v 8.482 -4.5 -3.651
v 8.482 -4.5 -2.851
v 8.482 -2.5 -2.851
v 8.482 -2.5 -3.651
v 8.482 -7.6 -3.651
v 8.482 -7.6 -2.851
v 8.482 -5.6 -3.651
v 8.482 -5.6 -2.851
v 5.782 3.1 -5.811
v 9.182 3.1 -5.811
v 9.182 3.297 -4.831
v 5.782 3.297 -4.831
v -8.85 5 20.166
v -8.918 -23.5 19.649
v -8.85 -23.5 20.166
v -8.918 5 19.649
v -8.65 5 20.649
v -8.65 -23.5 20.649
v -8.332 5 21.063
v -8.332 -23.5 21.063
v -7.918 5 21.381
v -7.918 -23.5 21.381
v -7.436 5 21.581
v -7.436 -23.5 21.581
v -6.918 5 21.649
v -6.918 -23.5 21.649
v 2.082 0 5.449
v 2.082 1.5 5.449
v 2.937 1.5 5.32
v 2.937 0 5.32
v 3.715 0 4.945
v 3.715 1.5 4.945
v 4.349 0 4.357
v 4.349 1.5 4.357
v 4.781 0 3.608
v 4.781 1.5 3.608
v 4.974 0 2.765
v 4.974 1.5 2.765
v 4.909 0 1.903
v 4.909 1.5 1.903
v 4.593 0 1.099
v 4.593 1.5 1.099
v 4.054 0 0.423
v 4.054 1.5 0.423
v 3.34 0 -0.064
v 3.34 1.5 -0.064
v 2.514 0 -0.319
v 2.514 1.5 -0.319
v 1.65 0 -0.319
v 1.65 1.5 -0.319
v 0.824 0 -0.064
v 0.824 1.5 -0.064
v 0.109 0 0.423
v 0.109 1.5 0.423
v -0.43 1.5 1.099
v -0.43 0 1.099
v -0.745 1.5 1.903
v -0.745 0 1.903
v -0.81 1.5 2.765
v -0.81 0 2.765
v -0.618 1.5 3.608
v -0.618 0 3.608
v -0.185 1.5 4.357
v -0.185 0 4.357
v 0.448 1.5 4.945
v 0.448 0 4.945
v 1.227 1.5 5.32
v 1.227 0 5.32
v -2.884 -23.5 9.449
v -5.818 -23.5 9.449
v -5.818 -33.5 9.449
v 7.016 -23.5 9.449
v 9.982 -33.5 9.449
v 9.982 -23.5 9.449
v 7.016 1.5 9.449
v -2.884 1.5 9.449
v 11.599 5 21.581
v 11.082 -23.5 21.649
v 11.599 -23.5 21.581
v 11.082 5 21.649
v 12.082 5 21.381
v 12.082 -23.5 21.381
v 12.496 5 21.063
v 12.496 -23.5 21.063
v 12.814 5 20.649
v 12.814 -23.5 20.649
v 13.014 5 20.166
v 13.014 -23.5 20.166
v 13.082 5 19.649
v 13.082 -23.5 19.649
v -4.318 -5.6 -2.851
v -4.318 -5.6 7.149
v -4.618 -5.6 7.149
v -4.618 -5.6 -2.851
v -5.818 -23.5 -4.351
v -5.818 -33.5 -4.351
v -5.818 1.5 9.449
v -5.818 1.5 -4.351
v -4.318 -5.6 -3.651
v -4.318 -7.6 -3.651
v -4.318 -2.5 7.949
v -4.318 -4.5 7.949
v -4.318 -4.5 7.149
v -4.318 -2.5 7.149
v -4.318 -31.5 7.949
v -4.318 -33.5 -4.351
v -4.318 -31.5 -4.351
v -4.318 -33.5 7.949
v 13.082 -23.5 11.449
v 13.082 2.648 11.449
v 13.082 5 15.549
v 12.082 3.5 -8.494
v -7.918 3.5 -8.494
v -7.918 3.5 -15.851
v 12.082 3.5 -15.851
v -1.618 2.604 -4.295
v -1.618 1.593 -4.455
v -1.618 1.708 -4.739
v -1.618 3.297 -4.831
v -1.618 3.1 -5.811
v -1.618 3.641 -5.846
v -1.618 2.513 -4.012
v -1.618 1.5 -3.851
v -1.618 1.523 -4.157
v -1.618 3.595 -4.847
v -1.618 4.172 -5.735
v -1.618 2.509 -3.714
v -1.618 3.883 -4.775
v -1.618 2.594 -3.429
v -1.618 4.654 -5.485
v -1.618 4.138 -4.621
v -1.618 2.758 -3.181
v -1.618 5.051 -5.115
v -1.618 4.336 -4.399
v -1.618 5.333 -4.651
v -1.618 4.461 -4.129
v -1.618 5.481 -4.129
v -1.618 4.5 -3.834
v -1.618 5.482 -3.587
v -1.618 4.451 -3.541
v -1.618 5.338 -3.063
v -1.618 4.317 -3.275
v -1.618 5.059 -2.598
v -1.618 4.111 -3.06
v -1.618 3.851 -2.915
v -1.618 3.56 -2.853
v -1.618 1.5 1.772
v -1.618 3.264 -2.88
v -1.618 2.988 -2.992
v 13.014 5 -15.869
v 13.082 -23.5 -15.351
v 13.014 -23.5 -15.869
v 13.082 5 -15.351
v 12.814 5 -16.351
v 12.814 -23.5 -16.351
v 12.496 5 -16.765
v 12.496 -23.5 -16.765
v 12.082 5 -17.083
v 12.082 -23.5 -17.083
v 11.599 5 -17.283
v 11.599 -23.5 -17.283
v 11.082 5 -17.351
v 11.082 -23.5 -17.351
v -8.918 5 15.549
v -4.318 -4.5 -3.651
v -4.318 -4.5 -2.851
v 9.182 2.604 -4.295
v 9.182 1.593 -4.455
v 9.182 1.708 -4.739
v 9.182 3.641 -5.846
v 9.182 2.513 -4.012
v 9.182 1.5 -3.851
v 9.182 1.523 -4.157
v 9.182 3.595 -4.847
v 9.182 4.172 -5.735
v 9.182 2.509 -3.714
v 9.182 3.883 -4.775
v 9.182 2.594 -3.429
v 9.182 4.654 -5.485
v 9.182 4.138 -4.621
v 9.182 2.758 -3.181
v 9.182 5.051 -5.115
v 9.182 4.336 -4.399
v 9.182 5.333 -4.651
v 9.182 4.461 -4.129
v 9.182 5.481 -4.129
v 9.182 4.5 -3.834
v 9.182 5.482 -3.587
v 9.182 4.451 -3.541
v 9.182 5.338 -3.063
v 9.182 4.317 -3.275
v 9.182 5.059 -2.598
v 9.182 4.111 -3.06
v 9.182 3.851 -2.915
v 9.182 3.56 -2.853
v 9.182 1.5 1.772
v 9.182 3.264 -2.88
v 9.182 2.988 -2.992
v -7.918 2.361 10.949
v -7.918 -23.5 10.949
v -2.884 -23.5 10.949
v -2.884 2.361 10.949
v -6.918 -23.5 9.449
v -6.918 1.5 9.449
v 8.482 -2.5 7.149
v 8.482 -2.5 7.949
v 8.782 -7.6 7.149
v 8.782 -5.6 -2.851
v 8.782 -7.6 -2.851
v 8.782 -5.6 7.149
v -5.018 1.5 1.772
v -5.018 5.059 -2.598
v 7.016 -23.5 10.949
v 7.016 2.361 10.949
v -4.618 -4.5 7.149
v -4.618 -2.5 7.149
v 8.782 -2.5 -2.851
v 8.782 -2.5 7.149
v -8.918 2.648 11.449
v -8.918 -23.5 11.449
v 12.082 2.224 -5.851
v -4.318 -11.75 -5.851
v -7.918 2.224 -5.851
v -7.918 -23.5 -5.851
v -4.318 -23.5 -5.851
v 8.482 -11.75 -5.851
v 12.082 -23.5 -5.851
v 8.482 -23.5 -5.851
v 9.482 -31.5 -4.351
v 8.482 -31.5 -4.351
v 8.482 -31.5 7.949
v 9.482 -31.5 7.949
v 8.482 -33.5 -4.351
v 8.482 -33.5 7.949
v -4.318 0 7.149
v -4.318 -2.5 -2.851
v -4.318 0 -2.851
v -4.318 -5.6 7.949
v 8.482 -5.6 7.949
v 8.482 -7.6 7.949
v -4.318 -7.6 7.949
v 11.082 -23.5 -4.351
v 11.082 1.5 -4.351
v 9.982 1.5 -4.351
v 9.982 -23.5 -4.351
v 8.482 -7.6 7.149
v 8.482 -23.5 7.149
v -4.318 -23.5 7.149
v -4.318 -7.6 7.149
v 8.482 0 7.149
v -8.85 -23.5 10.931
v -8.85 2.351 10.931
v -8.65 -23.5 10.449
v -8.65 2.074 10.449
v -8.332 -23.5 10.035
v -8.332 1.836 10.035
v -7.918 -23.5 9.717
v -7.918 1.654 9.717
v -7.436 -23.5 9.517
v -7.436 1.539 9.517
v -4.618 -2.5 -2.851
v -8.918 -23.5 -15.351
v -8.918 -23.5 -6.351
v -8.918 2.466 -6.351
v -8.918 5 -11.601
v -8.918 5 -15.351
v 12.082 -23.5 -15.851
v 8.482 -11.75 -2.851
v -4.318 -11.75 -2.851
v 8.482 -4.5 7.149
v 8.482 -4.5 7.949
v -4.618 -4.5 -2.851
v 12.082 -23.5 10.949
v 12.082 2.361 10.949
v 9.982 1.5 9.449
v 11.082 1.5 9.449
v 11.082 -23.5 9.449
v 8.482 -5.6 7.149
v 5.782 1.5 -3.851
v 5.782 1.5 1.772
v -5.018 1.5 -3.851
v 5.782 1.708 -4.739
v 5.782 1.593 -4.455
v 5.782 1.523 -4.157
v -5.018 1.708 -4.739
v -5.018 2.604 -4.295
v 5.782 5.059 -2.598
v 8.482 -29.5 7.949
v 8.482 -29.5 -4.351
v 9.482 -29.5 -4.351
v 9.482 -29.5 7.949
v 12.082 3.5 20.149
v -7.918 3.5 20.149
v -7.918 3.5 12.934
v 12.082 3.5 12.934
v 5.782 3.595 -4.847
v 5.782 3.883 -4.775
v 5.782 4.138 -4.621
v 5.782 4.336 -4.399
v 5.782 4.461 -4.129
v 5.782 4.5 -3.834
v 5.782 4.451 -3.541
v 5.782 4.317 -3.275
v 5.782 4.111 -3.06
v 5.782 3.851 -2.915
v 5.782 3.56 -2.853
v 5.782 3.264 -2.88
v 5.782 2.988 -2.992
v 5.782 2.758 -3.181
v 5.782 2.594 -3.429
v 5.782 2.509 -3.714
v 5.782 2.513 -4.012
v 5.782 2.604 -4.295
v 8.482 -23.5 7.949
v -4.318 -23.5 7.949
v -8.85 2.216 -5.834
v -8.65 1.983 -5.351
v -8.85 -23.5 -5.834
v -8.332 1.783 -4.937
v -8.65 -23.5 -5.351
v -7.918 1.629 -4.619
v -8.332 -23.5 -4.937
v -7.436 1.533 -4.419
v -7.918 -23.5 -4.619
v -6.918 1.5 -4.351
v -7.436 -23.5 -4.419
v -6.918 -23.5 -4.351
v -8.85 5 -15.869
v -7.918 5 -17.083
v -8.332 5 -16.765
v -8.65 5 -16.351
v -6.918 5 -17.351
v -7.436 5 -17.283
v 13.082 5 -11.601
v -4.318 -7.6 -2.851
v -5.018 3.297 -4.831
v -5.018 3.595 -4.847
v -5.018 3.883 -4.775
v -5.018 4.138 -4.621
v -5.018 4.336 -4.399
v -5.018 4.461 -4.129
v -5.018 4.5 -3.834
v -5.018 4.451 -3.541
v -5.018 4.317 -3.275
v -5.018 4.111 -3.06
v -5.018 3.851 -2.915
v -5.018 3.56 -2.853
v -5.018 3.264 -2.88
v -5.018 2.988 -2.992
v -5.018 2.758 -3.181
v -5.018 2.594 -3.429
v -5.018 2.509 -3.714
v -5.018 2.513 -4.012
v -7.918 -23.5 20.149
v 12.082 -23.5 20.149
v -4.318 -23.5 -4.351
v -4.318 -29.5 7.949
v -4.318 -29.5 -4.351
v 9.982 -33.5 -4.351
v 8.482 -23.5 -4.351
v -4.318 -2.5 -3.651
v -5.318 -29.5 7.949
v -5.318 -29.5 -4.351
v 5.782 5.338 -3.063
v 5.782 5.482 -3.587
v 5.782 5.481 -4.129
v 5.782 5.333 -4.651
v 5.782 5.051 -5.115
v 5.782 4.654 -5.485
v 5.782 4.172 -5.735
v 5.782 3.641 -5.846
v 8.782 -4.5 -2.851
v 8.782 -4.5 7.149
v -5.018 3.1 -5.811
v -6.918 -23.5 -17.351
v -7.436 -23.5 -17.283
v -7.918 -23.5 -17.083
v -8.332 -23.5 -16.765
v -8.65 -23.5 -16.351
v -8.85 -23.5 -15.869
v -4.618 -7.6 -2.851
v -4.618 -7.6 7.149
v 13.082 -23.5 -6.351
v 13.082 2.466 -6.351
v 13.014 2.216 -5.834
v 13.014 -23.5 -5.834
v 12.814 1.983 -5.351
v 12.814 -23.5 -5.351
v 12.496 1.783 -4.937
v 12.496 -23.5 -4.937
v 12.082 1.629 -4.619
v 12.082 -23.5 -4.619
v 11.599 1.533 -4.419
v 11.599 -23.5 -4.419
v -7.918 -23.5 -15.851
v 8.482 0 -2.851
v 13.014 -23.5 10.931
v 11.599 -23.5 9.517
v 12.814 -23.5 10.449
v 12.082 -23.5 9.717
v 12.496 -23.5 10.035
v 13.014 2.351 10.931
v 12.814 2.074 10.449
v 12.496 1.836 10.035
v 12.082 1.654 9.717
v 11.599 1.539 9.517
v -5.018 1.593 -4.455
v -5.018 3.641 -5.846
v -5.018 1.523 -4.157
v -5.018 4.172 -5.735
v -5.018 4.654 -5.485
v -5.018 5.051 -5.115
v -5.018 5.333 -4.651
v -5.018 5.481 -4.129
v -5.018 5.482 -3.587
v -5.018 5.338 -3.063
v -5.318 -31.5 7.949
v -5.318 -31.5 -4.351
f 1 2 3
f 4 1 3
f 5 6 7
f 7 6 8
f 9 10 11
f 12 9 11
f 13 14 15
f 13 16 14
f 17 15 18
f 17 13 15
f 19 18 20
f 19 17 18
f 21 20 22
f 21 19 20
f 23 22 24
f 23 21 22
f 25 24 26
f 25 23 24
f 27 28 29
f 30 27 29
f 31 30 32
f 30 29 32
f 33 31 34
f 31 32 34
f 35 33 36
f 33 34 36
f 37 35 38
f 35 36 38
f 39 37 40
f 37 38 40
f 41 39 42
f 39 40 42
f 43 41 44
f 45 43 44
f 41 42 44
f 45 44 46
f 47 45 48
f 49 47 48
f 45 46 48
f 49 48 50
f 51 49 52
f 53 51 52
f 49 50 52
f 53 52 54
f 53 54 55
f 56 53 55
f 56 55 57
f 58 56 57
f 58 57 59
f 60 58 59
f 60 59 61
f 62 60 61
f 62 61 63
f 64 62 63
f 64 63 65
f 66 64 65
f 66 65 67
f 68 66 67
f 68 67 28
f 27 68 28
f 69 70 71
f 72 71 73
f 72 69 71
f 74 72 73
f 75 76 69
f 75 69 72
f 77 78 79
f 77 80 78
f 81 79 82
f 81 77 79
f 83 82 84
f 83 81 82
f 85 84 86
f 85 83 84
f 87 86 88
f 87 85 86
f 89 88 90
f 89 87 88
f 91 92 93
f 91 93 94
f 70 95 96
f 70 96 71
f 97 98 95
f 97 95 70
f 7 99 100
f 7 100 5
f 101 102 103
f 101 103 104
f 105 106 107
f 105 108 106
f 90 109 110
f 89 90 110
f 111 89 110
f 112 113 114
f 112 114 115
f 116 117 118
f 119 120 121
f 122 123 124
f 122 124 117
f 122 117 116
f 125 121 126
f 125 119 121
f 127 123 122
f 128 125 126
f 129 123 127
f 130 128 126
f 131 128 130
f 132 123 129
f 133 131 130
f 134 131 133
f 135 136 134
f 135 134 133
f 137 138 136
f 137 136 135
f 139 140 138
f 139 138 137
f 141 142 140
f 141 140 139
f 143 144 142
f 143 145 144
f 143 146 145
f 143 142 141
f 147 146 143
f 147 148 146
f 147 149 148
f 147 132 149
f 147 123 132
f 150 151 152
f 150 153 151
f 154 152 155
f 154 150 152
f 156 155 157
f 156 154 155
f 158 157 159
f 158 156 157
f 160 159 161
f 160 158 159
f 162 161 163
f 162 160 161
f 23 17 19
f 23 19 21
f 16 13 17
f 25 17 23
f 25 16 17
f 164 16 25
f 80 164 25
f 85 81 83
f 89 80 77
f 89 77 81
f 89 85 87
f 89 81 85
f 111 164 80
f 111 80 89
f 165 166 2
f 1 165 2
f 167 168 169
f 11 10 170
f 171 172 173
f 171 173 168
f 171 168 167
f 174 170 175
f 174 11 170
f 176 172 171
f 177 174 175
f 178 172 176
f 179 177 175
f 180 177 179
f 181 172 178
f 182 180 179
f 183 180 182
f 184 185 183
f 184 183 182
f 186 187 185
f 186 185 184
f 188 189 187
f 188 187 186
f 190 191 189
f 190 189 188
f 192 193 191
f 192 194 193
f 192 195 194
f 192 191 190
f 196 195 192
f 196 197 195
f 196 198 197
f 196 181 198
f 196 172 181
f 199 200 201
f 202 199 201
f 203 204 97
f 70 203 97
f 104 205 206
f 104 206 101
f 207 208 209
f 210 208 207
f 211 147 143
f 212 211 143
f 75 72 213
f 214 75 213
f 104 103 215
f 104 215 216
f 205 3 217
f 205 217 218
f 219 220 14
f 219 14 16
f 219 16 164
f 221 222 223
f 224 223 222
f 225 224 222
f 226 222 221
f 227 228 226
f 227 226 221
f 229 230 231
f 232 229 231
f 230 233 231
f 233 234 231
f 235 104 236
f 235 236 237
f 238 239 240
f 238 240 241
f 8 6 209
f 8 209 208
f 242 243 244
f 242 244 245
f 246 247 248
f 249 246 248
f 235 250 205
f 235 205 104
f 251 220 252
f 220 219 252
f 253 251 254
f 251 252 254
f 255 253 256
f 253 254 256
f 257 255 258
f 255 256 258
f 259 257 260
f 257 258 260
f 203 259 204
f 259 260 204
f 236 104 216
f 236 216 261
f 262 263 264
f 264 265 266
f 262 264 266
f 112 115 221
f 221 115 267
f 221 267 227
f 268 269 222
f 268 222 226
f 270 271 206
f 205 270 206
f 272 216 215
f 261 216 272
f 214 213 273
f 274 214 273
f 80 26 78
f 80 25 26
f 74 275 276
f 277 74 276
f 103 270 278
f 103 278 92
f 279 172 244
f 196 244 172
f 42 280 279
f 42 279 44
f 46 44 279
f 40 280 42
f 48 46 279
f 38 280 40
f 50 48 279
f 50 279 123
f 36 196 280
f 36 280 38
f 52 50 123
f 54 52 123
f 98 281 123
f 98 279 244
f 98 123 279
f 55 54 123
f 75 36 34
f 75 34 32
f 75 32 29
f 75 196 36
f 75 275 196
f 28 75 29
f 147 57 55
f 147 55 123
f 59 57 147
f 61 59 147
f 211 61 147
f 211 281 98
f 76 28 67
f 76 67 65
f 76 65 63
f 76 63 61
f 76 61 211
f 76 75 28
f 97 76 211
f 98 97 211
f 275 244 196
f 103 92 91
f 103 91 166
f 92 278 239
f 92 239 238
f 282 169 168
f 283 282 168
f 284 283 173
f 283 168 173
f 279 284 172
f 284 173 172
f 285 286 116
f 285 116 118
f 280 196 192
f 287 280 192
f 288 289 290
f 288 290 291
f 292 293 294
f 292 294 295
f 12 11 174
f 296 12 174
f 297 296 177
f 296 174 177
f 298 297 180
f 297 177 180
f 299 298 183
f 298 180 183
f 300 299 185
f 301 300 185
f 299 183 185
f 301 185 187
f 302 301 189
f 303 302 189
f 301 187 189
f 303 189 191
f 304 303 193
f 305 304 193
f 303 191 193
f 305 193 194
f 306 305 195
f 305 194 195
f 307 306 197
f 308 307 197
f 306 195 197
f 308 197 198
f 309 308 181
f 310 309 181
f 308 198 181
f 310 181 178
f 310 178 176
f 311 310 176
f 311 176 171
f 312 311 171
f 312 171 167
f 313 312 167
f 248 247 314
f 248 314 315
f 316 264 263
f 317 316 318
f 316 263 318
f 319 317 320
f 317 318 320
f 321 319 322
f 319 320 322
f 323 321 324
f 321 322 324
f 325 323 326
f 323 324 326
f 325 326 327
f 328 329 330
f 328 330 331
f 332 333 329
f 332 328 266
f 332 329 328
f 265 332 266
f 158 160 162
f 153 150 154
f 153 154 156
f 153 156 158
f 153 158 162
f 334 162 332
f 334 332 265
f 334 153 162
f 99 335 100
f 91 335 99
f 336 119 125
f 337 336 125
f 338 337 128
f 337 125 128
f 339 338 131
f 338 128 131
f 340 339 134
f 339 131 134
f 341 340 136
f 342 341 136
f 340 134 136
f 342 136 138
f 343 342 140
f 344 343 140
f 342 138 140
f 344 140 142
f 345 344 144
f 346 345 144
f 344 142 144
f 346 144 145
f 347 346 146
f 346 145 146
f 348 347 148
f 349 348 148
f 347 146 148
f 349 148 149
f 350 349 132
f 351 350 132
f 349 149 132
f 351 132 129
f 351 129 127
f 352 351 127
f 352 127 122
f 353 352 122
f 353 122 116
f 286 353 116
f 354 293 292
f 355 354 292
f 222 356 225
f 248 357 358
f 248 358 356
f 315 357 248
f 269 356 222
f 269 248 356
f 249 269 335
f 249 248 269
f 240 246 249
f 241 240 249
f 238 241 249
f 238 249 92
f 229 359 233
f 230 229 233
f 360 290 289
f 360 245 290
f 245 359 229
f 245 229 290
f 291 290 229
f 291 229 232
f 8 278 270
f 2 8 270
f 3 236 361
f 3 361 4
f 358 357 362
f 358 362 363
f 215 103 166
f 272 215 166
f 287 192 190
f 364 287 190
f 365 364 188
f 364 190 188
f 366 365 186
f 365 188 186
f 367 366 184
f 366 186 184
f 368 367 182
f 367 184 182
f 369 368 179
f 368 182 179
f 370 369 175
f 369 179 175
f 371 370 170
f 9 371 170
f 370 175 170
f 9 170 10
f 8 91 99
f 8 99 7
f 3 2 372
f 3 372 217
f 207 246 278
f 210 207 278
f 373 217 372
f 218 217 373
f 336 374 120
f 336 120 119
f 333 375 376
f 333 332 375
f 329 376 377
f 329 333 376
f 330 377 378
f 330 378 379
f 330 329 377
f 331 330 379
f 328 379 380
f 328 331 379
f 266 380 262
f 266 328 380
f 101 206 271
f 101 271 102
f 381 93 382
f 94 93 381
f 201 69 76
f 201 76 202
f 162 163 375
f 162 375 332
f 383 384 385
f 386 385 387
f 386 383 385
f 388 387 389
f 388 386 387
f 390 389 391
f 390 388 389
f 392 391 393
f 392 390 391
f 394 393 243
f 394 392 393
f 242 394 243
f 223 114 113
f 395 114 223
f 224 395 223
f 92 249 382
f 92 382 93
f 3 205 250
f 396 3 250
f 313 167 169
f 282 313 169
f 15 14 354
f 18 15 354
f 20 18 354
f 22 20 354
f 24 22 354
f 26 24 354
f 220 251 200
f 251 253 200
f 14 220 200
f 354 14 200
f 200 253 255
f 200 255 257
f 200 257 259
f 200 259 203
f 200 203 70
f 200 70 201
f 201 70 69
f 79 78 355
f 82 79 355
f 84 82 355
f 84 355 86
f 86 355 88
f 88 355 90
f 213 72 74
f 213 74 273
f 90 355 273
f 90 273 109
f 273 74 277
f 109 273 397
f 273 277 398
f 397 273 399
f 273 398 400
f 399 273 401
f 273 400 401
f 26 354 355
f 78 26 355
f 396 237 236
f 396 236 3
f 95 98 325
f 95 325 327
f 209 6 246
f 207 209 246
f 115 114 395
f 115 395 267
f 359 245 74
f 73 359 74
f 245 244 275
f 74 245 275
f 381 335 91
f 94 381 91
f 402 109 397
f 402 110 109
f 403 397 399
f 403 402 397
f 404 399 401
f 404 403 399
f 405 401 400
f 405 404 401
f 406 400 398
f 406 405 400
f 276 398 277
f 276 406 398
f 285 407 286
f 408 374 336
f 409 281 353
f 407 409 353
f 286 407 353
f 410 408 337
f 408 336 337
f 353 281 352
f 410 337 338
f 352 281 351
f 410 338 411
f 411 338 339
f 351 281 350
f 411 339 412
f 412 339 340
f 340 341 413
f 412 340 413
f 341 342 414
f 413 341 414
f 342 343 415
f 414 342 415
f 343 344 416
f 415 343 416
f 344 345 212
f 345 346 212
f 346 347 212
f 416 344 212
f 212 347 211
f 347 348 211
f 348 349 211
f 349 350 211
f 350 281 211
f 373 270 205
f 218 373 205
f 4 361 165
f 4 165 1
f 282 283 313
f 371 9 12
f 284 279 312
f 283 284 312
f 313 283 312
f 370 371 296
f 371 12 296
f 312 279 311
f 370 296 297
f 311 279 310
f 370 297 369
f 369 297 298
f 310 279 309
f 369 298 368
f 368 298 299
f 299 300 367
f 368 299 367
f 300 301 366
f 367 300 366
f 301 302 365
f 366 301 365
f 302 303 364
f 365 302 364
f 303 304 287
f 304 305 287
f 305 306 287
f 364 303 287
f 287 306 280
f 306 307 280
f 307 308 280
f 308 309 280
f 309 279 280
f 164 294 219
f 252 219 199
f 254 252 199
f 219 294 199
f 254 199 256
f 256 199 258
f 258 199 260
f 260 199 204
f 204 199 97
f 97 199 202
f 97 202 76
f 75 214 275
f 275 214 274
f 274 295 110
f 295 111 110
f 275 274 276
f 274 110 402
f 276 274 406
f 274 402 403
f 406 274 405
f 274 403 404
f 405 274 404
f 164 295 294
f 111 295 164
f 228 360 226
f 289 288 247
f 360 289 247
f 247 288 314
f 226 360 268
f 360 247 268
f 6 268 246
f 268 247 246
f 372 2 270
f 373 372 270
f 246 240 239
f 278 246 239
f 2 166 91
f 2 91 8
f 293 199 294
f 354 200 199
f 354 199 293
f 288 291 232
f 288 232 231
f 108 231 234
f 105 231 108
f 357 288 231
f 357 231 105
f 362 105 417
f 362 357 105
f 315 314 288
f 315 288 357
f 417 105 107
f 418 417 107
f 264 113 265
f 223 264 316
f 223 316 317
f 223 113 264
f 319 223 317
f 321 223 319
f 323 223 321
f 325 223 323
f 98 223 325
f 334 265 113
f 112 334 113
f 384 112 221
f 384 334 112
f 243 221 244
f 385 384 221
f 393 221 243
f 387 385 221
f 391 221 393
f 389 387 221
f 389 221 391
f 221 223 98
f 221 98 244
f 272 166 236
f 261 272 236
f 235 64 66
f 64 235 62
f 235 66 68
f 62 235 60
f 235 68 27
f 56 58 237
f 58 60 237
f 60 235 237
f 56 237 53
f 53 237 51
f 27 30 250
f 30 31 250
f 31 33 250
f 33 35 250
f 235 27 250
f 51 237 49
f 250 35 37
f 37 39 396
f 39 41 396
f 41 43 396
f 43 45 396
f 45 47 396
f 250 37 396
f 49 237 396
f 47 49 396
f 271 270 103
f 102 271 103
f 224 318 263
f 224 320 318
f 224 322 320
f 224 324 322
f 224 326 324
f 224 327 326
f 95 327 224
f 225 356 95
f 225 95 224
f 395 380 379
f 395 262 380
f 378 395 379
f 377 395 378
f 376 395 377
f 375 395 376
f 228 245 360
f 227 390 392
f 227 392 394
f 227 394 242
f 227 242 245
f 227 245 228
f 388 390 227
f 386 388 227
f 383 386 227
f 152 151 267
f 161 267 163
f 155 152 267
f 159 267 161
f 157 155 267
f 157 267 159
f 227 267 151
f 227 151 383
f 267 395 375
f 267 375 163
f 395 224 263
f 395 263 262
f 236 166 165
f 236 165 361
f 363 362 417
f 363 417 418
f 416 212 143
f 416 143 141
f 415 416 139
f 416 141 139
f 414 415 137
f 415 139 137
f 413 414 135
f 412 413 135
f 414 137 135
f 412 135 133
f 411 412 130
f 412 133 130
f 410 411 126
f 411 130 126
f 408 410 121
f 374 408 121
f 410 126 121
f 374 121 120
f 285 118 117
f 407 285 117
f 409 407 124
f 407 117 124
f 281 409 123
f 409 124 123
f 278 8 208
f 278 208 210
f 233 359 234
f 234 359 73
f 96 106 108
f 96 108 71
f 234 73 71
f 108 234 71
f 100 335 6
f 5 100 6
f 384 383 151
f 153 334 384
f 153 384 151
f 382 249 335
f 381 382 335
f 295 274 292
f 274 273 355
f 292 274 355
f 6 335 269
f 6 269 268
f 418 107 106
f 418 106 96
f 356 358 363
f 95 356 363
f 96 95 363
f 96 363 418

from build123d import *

# Parameters (mm, degrees)
SKETCH_1_W               = 12.8
SKETCH_1_H               = 10.8
EXTRUDE_1_DEPTH          = 1.5
CUT_EXTRUDE_1_REACH      = 13.721
SKETCH_2_R               = 2.9
SKETCH_3_W               = 12.8
SKETCH_3_H               = 1.5
EXTRUDE_2_DEPTH          = 35
SKETCH_6_W               = 12.8
SKETCH_6_H               = 1.5
CUT_EXTRUDE_2_DEPTH      = 10
EXTRUDE_4_DEPTH          = 15.8
CUT_EXTRUDE_3_DEPTH      = 38.580939349
CUT_EXTRUDE_3_DEPTH_BACK = 38.580939349
SKETCH_10_W              = 7.4
SKETCH_10_H              = 4
SKETCH_10_W_2            = 0.8
EXTRUDE_5_DEPTH          = 3.1
EXTRUDE_5_DEPTH_BACK     = 18.9
SKETCH_18_W              = 20
SKETCH_18_H              = 10
CUT_EXTRUDE_4_DEPTH      = 27
CUT_EXTRUDE_5_REACH      = 40.777
SKETCH_20_W              = 12.8
SKETCH_20_H              = 11.75
FILLET_3_R               = 2
SKETCH_21_W              = 12.8
SKETCH_21_H              = 33.5
EXTRUDE_6_DEPTH          = 0.8
SKETCH_22_W              = 12.8
SKETCH_22_H              = 10
CUT_EXTRUDE_6_DEPTH      = 0.8
SKETCH_23_W              = 12.8
SKETCH_23_H              = 2
CUT_EXTRUDE_7_DEPTH      = 0.8
SKETCH_25_W              = 12.8
SKETCH_25_H              = 2
CUT_EXTRUDE_8_DEPTH      = 0.8
SKETCH_26_W              = 12.8
SKETCH_26_H              = 2
CUT_EXTRUDE_9_DEPTH      = 0.8
SKETCH_27_W              = 12.8
SKETCH_27_H              = 2
CUT_EXTRUDE_10_DEPTH     = 0.8
SKETCH_28_W              = 10
SKETCH_28_H              = 2
CUT_EXTRUDE_11_DEPTH     = 0.3
SKETCH_29_W              = 10
SKETCH_29_H              = 2
CUT_EXTRUDE_12_DEPTH     = 0.3
SKETCH_30_W              = 22
SKETCH_30_H              = 28.5
EXTRUDE_7_DEPTH          = 12.2
SKETCH_32_W              = 20
SKETCH_32_H              = 9.2
CUT_EXTRUDE_13_DEPTH     = 27
CUT_EXTRUDE_14_DEPTH     = 46.551260858
SKETCH_34_W              = 9.9
SKETCH_34_H              = 1.5
CUT_EXTRUDE_15_DEPTH     = 39.481186787
FILLET_4_R               = 2
SKETCH_36_W              = 12.3
SKETCH_36_H              = 2
CUT_EXTRUDE_18_DEPTH     = 1
SKETCH_37_W              = 12.3
SKETCH_37_H              = 2
CUT_EXTRUDE_19_DEPTH     = 1


with BuildPart() as part:
    # 草图1 → 凸台-拉伸1 (new body)
    with BuildSketch(Plane(origin=(0, 0, 0), x_dir=(1, 0, 0), z_dir=(0, 1, 0))):
        with Locations((2.081833616, -2.548726655)):
            Rectangle(SKETCH_1_W, SKETCH_1_H)
    extrude(amount=EXTRUDE_1_DEPTH)

    # 草图2 → 切除-拉伸1 (cut, up to next)
    with BuildSketch(Plane(origin=(0, 1.5, 0), x_dir=(1, 0, 0), z_dir=(0, 1, 0)), mode=Mode.PRIVATE) as cut_extrude_1_sk1:
        with Locations(Location((2.081833616, -2.548726655, 0), (0, 0, 270))):
            Circle(SKETCH_2_R)
    cut_extrude_1_tool1 = extrude(cut_extrude_1_sk1.sketch, amount=-CUT_EXTRUDE_1_REACH, mode=Mode.PRIVATE) & part.part
    add(cut_extrude_1_tool1.solids().sort_by_distance((2.081834, 1.5, 2.548727))[0], mode=Mode.SUBTRACT)

    # 草图3 → 凸台-拉伸2 (add)
    with BuildSketch(Plane(origin=(0, 1.5, 0), x_dir=(1, 0, 0), z_dir=(0, 1, 0))):
        Polygon((-4.318166384, 4.351273345), (-5.818166384, 4.351273345), (-5.818166384, -9.448726655), (-4.318166384, -9.448726655), (-4.318166384, -7.948726655), (-4.318166384, 2.851273345), align=None)
        with Locations((2.081833616, 3.601273345)):
            Rectangle(SKETCH_3_W, SKETCH_3_H)
        Polygon((8.481833616, 4.351273345), (9.981833616, 4.351273345), (9.981833616, -9.448726655), (8.481833616, -9.448726655), (8.481833616, -7.948726655), (8.481833616, 2.851273345), align=None)
        with Locations((2.081833616, -8.698726655)):
            Rectangle(SKETCH_3_W, SKETCH_3_H)
    extrude(amount=-EXTRUDE_2_DEPTH)

    # 草图6 → 切除-拉伸2 (cut)
    with BuildSketch(Plane.XZ.offset(33.5)):
        with Locations((2.081833616, -3.601273345)):
            Rectangle(SKETCH_6_W, SKETCH_6_H)
    extrude(amount=-CUT_EXTRUDE_2_DEPTH, mode=Mode.SUBTRACT)

    # 草图9 → 凸台-拉伸4 (add)
    with BuildSketch(Plane(origin=(9.981833616, 0, 0), x_dir=(0, 0, -1), z_dir=(1, 0, 0))):
        with BuildLine():
            Line((4.294951619, 2.603813865), (4.738629893, 1.70762773))
            ThreePointArc((4.738629893, 1.70762773), (4.306935204, 1.552598585), (3.851273345, 1.5))
            Line((3.851273345, 1.5), (-1.771682581, 1.5))
            Line((-1.771682581, 1.5), (2.59831793, 5.058878677))
            ThreePointArc((2.59831793, 5.058878677), (4.892528233, 5.207567937), (5.810847908, 3.099915598))
            Line((5.810847908, 3.099915598), (4.830532954, 3.297390482))
            ThreePointArc((4.830532954, 3.297390482), (3.059787283, 4.111187217), (4.294951619, 2.603813865))
        make_face()
    extrude(amount=-EXTRUDE_4_DEPTH)

    # 草图10 → 切除-拉伸3 (cut, two sides: drawn at the far end of the back side and taken through both)
    with BuildSketch(Plane(origin=(0, 0, -4.351273345), x_dir=(-1, 0, 0), z_dir=(0, 0, -1)).offset(-CUT_EXTRUDE_3_DEPTH_BACK)):
        with Locations((-2.081833616, 3.5)):
            Rectangle(SKETCH_10_W, SKETCH_10_H)
        with Locations((5.418166384, 3.5)):
            Rectangle(SKETCH_10_W_2, SKETCH_10_H)
        with Locations((-9.581833616, 3.5)):
            Rectangle(SKETCH_10_W_2, SKETCH_10_H)
    extrude(amount=CUT_EXTRUDE_3_DEPTH + CUT_EXTRUDE_3_DEPTH_BACK, mode=Mode.SUBTRACT)

    # 草图17 → 凸台-拉伸5 (add, two sides: drawn at the far end of the back side and taken through both)
    with BuildSketch(Plane.ZY.offset(5.818166384).offset(-EXTRUDE_5_DEPTH_BACK)):
        Polygon((-4.351273345, -23.5), (-17.351273345, -23.5), (-17.351273345, 5), (-11.601273345, 5), (-4.351273345, 1.5), align=None)
    extrude(amount=EXTRUDE_5_DEPTH + EXTRUDE_5_DEPTH_BACK)

    # 草图18 → 切除-拉伸4 (cut)
    with BuildSketch(Plane.XZ.offset(23.5)):
        with Locations((2.081833616, -10.851273345)):
            Rectangle(SKETCH_18_W, SKETCH_18_H)
    extrude(amount=-CUT_EXTRUDE_4_DEPTH, mode=Mode.SUBTRACT)

    # 草图20 → 切除-拉伸5 (cut, up to next)
    with BuildSketch(Plane.XY.offset(-2.851273345), mode=Mode.PRIVATE) as cut_extrude_5_sk1:
        with Locations((2.081833616, -17.625)):
            Rectangle(SKETCH_20_W, SKETCH_20_H)
    cut_extrude_5_tool1 = extrude(cut_extrude_5_sk1.sketch, amount=-CUT_EXTRUDE_5_REACH, mode=Mode.PRIVATE) & part.part
    add(cut_extrude_5_tool1.solids().sort_by_distance((2.081834, -17.625, -2.851273))[0], mode=Mode.SUBTRACT)

    # 圆角3
    fillet_3_edges = [part.edges().sort_by_distance(p)[0] for p in [
        (13.081833616, -11, -4.351273345),
        (13.081833616, -9.25, -17.351273345),
        (-8.918166384, -11, -4.351273345),
        (-8.918166384, -9.25, -17.351273345),
    ]]
    fillet(fillet_3_edges, radius=FILLET_3_R)

    # 草图21 → 凸台-拉伸6 (add)
    with BuildSketch(Plane(origin=(0, 0, 7.948726655), x_dir=(-1, 0, 0), z_dir=(0, 0, -1))):
        with Locations((-2.081833616, -16.75)):
            Rectangle(SKETCH_21_W, SKETCH_21_H)
    extrude(amount=EXTRUDE_6_DEPTH)

    # 草图22 → 切除-拉伸6 (cut)
    with BuildSketch(Plane(origin=(0, 0, 7.148726655), x_dir=(-1, 0, 0), z_dir=(0, 0, -1))):
        with Locations((-2.081833616, -28.5)):
            Rectangle(SKETCH_22_W, SKETCH_22_H)
    extrude(amount=-CUT_EXTRUDE_6_DEPTH, mode=Mode.SUBTRACT)

    # 草图23 → 切除-拉伸7 (cut)
    with BuildSketch(Plane(origin=(0, 0, 7.148726655), x_dir=(-1, 0, 0), z_dir=(0, 0, -1))):
        with Locations((-2.081833616, -3.5)):
            Rectangle(SKETCH_23_W, SKETCH_23_H)
    extrude(amount=-CUT_EXTRUDE_7_DEPTH, mode=Mode.SUBTRACT)

    # 草图25 → 切除-拉伸8 (cut)
    with BuildSketch(Plane.XY.offset(-2.851273345)):
        with Locations((2.081833616, -3.5)):
            Rectangle(SKETCH_25_W, SKETCH_25_H)
    extrude(amount=-CUT_EXTRUDE_8_DEPTH, mode=Mode.SUBTRACT)

    # 草图26 → 切除-拉伸9 (cut)
    with BuildSketch(Plane(origin=(0, 0, 7.148726655), x_dir=(-1, 0, 0), z_dir=(0, 0, -1))):
        with Locations((-2.081833616, -6.6)):
            Rectangle(SKETCH_26_W, SKETCH_26_H)
    extrude(amount=-CUT_EXTRUDE_9_DEPTH, mode=Mode.SUBTRACT)

    # 草图27 → 切除-拉伸10 (cut)
    with BuildSketch(Plane.XY.offset(-2.851273345)):
        with Locations((2.081833616, -6.6)):
            Rectangle(SKETCH_27_W, SKETCH_27_H)
    extrude(amount=-CUT_EXTRUDE_10_DEPTH, mode=Mode.SUBTRACT)

    # 草图28 → 切除-拉伸11 (cut)
    with BuildSketch(Plane(origin=(-4.318166384, 0, 0), x_dir=(0, 0, -1), z_dir=(1, 0, 0))):
        with Locations((-2.148726655, -6.6)):
            Rectangle(SKETCH_28_W, SKETCH_28_H)
        with Locations((-2.148726655, -3.5)):
            Rectangle(SKETCH_28_W, SKETCH_28_H)
    extrude(amount=-CUT_EXTRUDE_11_DEPTH, mode=Mode.SUBTRACT)

    # 草图29 → 切除-拉伸12 (cut)
    with BuildSketch(Plane.ZY.offset(-8.481833616)):
        with Locations((2.148726655, -3.5)):
            Rectangle(SKETCH_29_W, SKETCH_29_H)
        with Locations((2.148726655, -6.6)):
            Rectangle(SKETCH_29_W, SKETCH_29_H)
    extrude(amount=-CUT_EXTRUDE_12_DEPTH, mode=Mode.SUBTRACT)

    # 草图30 → 凸台-拉伸7 (add)
    with BuildSketch(Plane.XY.offset(9.448726655)):
        with Locations((2.081833616, -9.25)):
            Rectangle(SKETCH_30_W, SKETCH_30_H)
    extrude(amount=EXTRUDE_7_DEPTH)

    # 草图32 → 切除-拉伸13 (cut)
    with BuildSketch(Plane.XZ.offset(23.5)):
        with Locations((2.081833616, 15.548726655)):
            Rectangle(SKETCH_32_W, SKETCH_32_H)
    extrude(amount=-CUT_EXTRUDE_13_DEPTH, mode=Mode.SUBTRACT)

    # 草图33 → 切除-拉伸14 (cut, through all)
    with BuildSketch(Plane(origin=(13.081833616, 0, 0), x_dir=(0, 0, -1), z_dir=(1, 0, 0))):
        Polygon((-15.548726655, 5), (-9.448726655, 1.5), (-9.448726655, 5), align=None)
    extrude(amount=-CUT_EXTRUDE_14_DEPTH, mode=Mode.SUBTRACT)

    # 草图34 → 切除-拉伸15 (cut, through all)
    with BuildSketch(Plane.XZ.offset(23.5)):
        with Locations((2.065568836, 10.198726655)):
            Rectangle(SKETCH_34_W, SKETCH_34_H)
    extrude(amount=-CUT_EXTRUDE_15_DEPTH, mode=Mode.SUBTRACT)

    # 圆角4
    fillet_4_edges = [part.edges().sort_by_distance(p)[0] for p in [
        (13.081833616, -11, 9.448726655),
        (-8.918166384, -9.25, 21.648726655),
        (13.081833616, -9.25, 21.648726655),
        (-8.918166384, -11, 9.448726655),
    ]]
    fillet(fillet_4_edges, radius=FILLET_4_R)

    # 草图36 → 切除-拉伸18 (cut)
    with BuildSketch(Plane(origin=(-4.318166384, 0, 0), x_dir=(0, 0, -1), z_dir=(1, 0, 0))):
        with Locations((-1.798726655, -30.5)):
            Rectangle(SKETCH_36_W, SKETCH_36_H)
    extrude(amount=-CUT_EXTRUDE_18_DEPTH, mode=Mode.SUBTRACT)

    # 草图37 → 切除-拉伸19 (cut)
    with BuildSketch(Plane.ZY.offset(-8.481833616)):
        with Locations((1.798726655, -30.5)):
            Rectangle(SKETCH_37_W, SKETCH_37_H)
    extrude(amount=-CUT_EXTRUDE_19_DEPTH, mode=Mode.SUBTRACT)


solid = part.part
